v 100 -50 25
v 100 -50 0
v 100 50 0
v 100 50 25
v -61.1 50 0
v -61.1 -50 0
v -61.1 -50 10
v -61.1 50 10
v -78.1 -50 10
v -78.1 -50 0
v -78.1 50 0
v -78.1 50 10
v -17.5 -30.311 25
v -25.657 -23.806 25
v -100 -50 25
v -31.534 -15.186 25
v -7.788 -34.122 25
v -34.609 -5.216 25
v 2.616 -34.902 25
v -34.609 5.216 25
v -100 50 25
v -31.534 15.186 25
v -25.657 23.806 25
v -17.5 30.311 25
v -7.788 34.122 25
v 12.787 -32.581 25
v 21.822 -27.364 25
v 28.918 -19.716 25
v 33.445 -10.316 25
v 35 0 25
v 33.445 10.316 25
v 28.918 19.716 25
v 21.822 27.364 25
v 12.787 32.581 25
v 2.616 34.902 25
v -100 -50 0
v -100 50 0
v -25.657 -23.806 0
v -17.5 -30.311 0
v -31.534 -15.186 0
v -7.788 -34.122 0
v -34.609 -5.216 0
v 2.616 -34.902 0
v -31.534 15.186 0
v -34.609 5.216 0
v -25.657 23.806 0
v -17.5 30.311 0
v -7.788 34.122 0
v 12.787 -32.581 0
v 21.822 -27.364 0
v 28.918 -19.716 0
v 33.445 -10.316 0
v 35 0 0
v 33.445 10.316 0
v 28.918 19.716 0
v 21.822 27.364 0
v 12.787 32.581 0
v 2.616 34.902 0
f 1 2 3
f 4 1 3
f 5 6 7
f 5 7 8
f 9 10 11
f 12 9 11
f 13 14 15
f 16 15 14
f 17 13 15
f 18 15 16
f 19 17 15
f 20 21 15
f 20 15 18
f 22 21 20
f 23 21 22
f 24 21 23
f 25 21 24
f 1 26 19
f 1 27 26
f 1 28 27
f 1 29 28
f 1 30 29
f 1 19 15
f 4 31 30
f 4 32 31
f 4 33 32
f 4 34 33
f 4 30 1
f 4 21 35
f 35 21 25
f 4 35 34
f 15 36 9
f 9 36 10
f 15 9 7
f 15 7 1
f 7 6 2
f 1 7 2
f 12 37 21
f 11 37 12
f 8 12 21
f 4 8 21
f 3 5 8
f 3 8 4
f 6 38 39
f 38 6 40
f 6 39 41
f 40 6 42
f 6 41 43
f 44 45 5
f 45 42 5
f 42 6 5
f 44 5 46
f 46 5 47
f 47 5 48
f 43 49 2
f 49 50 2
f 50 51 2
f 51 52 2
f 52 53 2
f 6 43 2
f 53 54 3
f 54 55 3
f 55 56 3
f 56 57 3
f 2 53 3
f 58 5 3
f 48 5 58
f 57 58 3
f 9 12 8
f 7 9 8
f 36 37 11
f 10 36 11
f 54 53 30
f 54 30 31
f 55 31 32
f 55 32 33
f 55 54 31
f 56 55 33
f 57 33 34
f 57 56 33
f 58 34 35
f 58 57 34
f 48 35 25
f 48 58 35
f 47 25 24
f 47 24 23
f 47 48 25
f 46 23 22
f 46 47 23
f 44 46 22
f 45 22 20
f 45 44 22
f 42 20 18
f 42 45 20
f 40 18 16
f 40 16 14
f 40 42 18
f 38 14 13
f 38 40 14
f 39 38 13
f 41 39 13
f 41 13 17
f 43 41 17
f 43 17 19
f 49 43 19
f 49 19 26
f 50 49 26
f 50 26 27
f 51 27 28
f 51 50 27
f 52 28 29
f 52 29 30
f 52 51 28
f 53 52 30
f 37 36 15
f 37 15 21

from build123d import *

# Parameters (mm, degrees)
F0_W     = 200
F0_H     = 100
F0_R     = 35
F1_DEPTH = 25
F2_W     = 17
F2_H     = 100
F3_DEPTH = 10


with BuildPart() as f1:
    # F0 (on Top) → F1 (new body)
    with BuildSketch(Plane.XY):
        Rectangle(F0_W, F0_H)
        Circle(F0_R, mode=Mode.SUBTRACT)
    extrude(amount=F1_DEPTH)

    # F2 (on Top) → F3 (cut)
    with BuildSketch(Plane.XY):
        with Locations((-69.6, 0)):
            Rectangle(F2_W, F2_H)
    extrude(amount=F3_DEPTH, mode=Mode.SUBTRACT)


solid = f1.part
